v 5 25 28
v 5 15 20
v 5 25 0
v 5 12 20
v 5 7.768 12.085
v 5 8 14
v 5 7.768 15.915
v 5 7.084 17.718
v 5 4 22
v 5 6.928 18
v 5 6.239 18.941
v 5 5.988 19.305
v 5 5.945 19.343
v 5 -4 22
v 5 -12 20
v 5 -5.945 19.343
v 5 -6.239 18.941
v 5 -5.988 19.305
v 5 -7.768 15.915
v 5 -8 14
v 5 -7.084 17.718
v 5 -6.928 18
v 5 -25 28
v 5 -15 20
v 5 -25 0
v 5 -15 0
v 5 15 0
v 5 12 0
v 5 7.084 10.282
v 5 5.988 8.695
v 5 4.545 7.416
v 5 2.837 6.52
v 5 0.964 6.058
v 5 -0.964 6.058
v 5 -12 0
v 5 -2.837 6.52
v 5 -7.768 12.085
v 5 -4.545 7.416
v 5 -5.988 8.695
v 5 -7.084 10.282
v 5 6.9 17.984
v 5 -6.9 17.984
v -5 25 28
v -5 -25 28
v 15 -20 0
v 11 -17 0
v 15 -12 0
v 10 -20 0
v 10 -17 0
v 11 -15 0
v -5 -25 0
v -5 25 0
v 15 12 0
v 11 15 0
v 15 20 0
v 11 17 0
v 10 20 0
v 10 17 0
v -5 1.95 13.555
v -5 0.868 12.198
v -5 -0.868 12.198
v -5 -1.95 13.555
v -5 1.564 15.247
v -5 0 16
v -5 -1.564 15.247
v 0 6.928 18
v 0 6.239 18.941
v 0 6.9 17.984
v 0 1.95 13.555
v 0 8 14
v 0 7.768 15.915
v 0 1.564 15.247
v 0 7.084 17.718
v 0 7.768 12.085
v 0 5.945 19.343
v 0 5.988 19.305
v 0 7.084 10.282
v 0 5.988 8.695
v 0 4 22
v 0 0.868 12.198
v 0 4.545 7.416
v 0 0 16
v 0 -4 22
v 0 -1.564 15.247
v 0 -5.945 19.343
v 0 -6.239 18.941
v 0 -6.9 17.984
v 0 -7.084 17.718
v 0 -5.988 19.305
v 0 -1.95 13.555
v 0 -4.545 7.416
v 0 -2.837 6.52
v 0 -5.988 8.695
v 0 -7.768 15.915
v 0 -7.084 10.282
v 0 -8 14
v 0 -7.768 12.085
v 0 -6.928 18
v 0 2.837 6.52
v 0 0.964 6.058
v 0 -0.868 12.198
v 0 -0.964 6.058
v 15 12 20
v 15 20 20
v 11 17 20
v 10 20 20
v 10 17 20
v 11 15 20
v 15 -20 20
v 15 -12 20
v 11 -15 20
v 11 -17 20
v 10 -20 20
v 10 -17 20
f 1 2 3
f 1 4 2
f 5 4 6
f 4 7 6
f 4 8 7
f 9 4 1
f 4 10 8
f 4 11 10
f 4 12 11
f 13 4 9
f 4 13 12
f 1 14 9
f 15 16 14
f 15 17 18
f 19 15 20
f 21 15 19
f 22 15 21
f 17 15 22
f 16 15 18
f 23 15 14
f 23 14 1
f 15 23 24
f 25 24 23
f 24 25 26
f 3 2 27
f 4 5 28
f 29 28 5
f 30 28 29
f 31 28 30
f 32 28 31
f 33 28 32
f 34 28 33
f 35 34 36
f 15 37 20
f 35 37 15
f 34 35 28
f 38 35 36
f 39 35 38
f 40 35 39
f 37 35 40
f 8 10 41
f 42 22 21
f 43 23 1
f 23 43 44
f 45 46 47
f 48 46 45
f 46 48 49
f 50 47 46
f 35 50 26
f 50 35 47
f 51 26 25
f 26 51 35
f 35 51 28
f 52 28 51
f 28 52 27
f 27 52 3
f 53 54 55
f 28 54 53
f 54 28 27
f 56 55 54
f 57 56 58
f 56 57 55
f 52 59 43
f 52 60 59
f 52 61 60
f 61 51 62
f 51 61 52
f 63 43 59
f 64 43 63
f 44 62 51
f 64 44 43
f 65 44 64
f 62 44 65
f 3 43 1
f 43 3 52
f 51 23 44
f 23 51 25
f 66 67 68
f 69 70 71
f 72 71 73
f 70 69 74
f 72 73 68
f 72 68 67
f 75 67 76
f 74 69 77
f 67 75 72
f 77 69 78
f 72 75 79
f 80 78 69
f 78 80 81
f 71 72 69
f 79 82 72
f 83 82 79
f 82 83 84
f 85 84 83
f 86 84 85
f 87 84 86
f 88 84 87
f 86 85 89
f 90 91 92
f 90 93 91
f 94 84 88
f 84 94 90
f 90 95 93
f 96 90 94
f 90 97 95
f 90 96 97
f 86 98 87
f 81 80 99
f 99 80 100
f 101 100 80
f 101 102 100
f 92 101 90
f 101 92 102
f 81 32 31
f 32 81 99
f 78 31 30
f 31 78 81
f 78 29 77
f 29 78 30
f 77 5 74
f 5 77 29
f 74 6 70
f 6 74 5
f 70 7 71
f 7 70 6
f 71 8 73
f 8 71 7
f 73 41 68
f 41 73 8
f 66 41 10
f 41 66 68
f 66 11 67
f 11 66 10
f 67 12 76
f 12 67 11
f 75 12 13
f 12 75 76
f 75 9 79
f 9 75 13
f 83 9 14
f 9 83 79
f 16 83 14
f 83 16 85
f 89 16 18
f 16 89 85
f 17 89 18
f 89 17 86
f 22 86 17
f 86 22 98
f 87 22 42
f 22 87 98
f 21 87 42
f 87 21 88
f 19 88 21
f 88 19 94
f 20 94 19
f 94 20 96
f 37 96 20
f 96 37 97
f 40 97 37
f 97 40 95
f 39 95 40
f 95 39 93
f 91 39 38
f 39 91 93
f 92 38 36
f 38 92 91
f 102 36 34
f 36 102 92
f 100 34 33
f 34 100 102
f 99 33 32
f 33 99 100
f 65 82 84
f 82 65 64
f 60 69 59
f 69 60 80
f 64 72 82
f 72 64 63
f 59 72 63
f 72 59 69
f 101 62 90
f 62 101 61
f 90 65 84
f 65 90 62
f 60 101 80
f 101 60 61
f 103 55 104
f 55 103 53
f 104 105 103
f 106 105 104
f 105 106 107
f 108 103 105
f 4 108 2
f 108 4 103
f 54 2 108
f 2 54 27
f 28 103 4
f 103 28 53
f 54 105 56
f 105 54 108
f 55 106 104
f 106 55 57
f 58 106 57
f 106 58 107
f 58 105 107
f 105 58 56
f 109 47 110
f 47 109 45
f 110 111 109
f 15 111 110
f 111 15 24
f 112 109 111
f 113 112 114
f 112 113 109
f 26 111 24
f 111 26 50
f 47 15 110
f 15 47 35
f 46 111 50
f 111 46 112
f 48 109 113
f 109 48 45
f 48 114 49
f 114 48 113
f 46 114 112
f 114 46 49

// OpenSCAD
module teardrop (r=8,h=20)
{
	rotate([-270,0,90])
	linear_extrude(height=h)
	{
		circle(r=r);
		polygon(points=[[0,0],[r*cos(30),r*sin(30)],[0.5*r,r],[-0.5*r,r],[-r*cos(30),r*sin(30)]],
				paths=[[0,1,2,3,4]]);
	}
}

translate([0,0,14])difference(){
cube(size = [10,50,28], center = true);
teardrop(8, 10);
rotate(a=[0,-90,0])cylinder(h = 30, r=2, center=true);
}
module hook(){
translate([10,12+1.5,10]) cube(size = [10,3,20], center = true);
translate([13,5+12+0.5,10]) cube(size = [4,5,20], center = true);
translate([10.5,1+5+12+0.5,10]) cube(size = [1,3,20], center = true);
}
hook();
mirror([ 0, 1, 0 ])hook();
